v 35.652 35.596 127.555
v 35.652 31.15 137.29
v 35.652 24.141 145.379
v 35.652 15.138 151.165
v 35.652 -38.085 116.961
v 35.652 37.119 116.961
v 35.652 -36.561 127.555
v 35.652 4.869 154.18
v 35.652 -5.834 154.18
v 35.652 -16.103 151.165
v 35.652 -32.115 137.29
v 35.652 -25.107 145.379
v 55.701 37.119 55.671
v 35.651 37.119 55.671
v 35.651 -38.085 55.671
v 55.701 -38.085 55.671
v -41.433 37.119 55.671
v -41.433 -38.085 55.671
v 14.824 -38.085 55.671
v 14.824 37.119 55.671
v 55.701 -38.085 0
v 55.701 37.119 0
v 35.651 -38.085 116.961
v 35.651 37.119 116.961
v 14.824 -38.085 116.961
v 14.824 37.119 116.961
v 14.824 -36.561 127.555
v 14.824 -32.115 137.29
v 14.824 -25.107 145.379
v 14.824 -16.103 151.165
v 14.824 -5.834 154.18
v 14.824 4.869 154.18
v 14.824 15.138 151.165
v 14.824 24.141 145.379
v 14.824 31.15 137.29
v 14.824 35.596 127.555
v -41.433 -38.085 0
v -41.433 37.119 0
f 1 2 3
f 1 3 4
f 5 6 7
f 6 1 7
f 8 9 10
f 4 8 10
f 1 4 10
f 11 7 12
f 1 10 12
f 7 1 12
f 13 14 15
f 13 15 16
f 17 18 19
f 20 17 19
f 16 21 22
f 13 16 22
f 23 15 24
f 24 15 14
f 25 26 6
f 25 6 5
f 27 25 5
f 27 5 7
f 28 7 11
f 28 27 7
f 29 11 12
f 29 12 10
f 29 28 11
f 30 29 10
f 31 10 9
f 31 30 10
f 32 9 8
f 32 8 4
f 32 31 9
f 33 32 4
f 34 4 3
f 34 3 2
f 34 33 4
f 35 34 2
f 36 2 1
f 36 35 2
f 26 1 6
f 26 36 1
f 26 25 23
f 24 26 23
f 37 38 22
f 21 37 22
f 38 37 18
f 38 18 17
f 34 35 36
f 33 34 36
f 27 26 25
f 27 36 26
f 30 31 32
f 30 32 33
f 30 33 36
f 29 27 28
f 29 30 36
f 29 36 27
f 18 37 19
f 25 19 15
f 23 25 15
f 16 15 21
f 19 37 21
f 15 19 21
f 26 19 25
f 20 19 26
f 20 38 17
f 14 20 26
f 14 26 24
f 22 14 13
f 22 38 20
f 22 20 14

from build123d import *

# Parameters (mm, degrees)
F0_W     = 97.134546
F0_H     = 75.203538
F1_DEPTH = 55.67118
F2_W     = 20.826727
F2_H     = 75.203538
F3_DEPTH = 61.289886
F5_DEPTH = 20.828


with BuildPart() as f1:
    # F0 (on Top) → F1 (new body)
    with BuildSketch(Plane.XY):
        with Locations((7.134177, -0.482738)):
            Rectangle(F0_W, F0_H)
    extrude(amount=F1_DEPTH)

    # F2 (on face) → F3 (join)
    with BuildSketch(Plane.XY.offset(55.67118)):
        with Locations((25.237396, -0.482738)):
            Rectangle(F2_W, F2_H)
    extrude(amount=F3_DEPTH)


with BuildPart() as f5:
    # F4 (on face) → F5 (new body)
    with BuildSketch(Plane(origin=(14.824033, 0, 0), x_dir=(0, -1, 0), z_dir=(-1, 0, 0))):
        with BuildLine():
            Line((-37.119031, 116.961066), (38.084507, 116.961066))
            ThreePointArc((38.084507, 116.961066), (0.482738, 154.562835), (-37.119031, 116.961066))
        make_face()
    extrude(amount=-F5_DEPTH)


solid = Compound([f1.part, f5.part])
